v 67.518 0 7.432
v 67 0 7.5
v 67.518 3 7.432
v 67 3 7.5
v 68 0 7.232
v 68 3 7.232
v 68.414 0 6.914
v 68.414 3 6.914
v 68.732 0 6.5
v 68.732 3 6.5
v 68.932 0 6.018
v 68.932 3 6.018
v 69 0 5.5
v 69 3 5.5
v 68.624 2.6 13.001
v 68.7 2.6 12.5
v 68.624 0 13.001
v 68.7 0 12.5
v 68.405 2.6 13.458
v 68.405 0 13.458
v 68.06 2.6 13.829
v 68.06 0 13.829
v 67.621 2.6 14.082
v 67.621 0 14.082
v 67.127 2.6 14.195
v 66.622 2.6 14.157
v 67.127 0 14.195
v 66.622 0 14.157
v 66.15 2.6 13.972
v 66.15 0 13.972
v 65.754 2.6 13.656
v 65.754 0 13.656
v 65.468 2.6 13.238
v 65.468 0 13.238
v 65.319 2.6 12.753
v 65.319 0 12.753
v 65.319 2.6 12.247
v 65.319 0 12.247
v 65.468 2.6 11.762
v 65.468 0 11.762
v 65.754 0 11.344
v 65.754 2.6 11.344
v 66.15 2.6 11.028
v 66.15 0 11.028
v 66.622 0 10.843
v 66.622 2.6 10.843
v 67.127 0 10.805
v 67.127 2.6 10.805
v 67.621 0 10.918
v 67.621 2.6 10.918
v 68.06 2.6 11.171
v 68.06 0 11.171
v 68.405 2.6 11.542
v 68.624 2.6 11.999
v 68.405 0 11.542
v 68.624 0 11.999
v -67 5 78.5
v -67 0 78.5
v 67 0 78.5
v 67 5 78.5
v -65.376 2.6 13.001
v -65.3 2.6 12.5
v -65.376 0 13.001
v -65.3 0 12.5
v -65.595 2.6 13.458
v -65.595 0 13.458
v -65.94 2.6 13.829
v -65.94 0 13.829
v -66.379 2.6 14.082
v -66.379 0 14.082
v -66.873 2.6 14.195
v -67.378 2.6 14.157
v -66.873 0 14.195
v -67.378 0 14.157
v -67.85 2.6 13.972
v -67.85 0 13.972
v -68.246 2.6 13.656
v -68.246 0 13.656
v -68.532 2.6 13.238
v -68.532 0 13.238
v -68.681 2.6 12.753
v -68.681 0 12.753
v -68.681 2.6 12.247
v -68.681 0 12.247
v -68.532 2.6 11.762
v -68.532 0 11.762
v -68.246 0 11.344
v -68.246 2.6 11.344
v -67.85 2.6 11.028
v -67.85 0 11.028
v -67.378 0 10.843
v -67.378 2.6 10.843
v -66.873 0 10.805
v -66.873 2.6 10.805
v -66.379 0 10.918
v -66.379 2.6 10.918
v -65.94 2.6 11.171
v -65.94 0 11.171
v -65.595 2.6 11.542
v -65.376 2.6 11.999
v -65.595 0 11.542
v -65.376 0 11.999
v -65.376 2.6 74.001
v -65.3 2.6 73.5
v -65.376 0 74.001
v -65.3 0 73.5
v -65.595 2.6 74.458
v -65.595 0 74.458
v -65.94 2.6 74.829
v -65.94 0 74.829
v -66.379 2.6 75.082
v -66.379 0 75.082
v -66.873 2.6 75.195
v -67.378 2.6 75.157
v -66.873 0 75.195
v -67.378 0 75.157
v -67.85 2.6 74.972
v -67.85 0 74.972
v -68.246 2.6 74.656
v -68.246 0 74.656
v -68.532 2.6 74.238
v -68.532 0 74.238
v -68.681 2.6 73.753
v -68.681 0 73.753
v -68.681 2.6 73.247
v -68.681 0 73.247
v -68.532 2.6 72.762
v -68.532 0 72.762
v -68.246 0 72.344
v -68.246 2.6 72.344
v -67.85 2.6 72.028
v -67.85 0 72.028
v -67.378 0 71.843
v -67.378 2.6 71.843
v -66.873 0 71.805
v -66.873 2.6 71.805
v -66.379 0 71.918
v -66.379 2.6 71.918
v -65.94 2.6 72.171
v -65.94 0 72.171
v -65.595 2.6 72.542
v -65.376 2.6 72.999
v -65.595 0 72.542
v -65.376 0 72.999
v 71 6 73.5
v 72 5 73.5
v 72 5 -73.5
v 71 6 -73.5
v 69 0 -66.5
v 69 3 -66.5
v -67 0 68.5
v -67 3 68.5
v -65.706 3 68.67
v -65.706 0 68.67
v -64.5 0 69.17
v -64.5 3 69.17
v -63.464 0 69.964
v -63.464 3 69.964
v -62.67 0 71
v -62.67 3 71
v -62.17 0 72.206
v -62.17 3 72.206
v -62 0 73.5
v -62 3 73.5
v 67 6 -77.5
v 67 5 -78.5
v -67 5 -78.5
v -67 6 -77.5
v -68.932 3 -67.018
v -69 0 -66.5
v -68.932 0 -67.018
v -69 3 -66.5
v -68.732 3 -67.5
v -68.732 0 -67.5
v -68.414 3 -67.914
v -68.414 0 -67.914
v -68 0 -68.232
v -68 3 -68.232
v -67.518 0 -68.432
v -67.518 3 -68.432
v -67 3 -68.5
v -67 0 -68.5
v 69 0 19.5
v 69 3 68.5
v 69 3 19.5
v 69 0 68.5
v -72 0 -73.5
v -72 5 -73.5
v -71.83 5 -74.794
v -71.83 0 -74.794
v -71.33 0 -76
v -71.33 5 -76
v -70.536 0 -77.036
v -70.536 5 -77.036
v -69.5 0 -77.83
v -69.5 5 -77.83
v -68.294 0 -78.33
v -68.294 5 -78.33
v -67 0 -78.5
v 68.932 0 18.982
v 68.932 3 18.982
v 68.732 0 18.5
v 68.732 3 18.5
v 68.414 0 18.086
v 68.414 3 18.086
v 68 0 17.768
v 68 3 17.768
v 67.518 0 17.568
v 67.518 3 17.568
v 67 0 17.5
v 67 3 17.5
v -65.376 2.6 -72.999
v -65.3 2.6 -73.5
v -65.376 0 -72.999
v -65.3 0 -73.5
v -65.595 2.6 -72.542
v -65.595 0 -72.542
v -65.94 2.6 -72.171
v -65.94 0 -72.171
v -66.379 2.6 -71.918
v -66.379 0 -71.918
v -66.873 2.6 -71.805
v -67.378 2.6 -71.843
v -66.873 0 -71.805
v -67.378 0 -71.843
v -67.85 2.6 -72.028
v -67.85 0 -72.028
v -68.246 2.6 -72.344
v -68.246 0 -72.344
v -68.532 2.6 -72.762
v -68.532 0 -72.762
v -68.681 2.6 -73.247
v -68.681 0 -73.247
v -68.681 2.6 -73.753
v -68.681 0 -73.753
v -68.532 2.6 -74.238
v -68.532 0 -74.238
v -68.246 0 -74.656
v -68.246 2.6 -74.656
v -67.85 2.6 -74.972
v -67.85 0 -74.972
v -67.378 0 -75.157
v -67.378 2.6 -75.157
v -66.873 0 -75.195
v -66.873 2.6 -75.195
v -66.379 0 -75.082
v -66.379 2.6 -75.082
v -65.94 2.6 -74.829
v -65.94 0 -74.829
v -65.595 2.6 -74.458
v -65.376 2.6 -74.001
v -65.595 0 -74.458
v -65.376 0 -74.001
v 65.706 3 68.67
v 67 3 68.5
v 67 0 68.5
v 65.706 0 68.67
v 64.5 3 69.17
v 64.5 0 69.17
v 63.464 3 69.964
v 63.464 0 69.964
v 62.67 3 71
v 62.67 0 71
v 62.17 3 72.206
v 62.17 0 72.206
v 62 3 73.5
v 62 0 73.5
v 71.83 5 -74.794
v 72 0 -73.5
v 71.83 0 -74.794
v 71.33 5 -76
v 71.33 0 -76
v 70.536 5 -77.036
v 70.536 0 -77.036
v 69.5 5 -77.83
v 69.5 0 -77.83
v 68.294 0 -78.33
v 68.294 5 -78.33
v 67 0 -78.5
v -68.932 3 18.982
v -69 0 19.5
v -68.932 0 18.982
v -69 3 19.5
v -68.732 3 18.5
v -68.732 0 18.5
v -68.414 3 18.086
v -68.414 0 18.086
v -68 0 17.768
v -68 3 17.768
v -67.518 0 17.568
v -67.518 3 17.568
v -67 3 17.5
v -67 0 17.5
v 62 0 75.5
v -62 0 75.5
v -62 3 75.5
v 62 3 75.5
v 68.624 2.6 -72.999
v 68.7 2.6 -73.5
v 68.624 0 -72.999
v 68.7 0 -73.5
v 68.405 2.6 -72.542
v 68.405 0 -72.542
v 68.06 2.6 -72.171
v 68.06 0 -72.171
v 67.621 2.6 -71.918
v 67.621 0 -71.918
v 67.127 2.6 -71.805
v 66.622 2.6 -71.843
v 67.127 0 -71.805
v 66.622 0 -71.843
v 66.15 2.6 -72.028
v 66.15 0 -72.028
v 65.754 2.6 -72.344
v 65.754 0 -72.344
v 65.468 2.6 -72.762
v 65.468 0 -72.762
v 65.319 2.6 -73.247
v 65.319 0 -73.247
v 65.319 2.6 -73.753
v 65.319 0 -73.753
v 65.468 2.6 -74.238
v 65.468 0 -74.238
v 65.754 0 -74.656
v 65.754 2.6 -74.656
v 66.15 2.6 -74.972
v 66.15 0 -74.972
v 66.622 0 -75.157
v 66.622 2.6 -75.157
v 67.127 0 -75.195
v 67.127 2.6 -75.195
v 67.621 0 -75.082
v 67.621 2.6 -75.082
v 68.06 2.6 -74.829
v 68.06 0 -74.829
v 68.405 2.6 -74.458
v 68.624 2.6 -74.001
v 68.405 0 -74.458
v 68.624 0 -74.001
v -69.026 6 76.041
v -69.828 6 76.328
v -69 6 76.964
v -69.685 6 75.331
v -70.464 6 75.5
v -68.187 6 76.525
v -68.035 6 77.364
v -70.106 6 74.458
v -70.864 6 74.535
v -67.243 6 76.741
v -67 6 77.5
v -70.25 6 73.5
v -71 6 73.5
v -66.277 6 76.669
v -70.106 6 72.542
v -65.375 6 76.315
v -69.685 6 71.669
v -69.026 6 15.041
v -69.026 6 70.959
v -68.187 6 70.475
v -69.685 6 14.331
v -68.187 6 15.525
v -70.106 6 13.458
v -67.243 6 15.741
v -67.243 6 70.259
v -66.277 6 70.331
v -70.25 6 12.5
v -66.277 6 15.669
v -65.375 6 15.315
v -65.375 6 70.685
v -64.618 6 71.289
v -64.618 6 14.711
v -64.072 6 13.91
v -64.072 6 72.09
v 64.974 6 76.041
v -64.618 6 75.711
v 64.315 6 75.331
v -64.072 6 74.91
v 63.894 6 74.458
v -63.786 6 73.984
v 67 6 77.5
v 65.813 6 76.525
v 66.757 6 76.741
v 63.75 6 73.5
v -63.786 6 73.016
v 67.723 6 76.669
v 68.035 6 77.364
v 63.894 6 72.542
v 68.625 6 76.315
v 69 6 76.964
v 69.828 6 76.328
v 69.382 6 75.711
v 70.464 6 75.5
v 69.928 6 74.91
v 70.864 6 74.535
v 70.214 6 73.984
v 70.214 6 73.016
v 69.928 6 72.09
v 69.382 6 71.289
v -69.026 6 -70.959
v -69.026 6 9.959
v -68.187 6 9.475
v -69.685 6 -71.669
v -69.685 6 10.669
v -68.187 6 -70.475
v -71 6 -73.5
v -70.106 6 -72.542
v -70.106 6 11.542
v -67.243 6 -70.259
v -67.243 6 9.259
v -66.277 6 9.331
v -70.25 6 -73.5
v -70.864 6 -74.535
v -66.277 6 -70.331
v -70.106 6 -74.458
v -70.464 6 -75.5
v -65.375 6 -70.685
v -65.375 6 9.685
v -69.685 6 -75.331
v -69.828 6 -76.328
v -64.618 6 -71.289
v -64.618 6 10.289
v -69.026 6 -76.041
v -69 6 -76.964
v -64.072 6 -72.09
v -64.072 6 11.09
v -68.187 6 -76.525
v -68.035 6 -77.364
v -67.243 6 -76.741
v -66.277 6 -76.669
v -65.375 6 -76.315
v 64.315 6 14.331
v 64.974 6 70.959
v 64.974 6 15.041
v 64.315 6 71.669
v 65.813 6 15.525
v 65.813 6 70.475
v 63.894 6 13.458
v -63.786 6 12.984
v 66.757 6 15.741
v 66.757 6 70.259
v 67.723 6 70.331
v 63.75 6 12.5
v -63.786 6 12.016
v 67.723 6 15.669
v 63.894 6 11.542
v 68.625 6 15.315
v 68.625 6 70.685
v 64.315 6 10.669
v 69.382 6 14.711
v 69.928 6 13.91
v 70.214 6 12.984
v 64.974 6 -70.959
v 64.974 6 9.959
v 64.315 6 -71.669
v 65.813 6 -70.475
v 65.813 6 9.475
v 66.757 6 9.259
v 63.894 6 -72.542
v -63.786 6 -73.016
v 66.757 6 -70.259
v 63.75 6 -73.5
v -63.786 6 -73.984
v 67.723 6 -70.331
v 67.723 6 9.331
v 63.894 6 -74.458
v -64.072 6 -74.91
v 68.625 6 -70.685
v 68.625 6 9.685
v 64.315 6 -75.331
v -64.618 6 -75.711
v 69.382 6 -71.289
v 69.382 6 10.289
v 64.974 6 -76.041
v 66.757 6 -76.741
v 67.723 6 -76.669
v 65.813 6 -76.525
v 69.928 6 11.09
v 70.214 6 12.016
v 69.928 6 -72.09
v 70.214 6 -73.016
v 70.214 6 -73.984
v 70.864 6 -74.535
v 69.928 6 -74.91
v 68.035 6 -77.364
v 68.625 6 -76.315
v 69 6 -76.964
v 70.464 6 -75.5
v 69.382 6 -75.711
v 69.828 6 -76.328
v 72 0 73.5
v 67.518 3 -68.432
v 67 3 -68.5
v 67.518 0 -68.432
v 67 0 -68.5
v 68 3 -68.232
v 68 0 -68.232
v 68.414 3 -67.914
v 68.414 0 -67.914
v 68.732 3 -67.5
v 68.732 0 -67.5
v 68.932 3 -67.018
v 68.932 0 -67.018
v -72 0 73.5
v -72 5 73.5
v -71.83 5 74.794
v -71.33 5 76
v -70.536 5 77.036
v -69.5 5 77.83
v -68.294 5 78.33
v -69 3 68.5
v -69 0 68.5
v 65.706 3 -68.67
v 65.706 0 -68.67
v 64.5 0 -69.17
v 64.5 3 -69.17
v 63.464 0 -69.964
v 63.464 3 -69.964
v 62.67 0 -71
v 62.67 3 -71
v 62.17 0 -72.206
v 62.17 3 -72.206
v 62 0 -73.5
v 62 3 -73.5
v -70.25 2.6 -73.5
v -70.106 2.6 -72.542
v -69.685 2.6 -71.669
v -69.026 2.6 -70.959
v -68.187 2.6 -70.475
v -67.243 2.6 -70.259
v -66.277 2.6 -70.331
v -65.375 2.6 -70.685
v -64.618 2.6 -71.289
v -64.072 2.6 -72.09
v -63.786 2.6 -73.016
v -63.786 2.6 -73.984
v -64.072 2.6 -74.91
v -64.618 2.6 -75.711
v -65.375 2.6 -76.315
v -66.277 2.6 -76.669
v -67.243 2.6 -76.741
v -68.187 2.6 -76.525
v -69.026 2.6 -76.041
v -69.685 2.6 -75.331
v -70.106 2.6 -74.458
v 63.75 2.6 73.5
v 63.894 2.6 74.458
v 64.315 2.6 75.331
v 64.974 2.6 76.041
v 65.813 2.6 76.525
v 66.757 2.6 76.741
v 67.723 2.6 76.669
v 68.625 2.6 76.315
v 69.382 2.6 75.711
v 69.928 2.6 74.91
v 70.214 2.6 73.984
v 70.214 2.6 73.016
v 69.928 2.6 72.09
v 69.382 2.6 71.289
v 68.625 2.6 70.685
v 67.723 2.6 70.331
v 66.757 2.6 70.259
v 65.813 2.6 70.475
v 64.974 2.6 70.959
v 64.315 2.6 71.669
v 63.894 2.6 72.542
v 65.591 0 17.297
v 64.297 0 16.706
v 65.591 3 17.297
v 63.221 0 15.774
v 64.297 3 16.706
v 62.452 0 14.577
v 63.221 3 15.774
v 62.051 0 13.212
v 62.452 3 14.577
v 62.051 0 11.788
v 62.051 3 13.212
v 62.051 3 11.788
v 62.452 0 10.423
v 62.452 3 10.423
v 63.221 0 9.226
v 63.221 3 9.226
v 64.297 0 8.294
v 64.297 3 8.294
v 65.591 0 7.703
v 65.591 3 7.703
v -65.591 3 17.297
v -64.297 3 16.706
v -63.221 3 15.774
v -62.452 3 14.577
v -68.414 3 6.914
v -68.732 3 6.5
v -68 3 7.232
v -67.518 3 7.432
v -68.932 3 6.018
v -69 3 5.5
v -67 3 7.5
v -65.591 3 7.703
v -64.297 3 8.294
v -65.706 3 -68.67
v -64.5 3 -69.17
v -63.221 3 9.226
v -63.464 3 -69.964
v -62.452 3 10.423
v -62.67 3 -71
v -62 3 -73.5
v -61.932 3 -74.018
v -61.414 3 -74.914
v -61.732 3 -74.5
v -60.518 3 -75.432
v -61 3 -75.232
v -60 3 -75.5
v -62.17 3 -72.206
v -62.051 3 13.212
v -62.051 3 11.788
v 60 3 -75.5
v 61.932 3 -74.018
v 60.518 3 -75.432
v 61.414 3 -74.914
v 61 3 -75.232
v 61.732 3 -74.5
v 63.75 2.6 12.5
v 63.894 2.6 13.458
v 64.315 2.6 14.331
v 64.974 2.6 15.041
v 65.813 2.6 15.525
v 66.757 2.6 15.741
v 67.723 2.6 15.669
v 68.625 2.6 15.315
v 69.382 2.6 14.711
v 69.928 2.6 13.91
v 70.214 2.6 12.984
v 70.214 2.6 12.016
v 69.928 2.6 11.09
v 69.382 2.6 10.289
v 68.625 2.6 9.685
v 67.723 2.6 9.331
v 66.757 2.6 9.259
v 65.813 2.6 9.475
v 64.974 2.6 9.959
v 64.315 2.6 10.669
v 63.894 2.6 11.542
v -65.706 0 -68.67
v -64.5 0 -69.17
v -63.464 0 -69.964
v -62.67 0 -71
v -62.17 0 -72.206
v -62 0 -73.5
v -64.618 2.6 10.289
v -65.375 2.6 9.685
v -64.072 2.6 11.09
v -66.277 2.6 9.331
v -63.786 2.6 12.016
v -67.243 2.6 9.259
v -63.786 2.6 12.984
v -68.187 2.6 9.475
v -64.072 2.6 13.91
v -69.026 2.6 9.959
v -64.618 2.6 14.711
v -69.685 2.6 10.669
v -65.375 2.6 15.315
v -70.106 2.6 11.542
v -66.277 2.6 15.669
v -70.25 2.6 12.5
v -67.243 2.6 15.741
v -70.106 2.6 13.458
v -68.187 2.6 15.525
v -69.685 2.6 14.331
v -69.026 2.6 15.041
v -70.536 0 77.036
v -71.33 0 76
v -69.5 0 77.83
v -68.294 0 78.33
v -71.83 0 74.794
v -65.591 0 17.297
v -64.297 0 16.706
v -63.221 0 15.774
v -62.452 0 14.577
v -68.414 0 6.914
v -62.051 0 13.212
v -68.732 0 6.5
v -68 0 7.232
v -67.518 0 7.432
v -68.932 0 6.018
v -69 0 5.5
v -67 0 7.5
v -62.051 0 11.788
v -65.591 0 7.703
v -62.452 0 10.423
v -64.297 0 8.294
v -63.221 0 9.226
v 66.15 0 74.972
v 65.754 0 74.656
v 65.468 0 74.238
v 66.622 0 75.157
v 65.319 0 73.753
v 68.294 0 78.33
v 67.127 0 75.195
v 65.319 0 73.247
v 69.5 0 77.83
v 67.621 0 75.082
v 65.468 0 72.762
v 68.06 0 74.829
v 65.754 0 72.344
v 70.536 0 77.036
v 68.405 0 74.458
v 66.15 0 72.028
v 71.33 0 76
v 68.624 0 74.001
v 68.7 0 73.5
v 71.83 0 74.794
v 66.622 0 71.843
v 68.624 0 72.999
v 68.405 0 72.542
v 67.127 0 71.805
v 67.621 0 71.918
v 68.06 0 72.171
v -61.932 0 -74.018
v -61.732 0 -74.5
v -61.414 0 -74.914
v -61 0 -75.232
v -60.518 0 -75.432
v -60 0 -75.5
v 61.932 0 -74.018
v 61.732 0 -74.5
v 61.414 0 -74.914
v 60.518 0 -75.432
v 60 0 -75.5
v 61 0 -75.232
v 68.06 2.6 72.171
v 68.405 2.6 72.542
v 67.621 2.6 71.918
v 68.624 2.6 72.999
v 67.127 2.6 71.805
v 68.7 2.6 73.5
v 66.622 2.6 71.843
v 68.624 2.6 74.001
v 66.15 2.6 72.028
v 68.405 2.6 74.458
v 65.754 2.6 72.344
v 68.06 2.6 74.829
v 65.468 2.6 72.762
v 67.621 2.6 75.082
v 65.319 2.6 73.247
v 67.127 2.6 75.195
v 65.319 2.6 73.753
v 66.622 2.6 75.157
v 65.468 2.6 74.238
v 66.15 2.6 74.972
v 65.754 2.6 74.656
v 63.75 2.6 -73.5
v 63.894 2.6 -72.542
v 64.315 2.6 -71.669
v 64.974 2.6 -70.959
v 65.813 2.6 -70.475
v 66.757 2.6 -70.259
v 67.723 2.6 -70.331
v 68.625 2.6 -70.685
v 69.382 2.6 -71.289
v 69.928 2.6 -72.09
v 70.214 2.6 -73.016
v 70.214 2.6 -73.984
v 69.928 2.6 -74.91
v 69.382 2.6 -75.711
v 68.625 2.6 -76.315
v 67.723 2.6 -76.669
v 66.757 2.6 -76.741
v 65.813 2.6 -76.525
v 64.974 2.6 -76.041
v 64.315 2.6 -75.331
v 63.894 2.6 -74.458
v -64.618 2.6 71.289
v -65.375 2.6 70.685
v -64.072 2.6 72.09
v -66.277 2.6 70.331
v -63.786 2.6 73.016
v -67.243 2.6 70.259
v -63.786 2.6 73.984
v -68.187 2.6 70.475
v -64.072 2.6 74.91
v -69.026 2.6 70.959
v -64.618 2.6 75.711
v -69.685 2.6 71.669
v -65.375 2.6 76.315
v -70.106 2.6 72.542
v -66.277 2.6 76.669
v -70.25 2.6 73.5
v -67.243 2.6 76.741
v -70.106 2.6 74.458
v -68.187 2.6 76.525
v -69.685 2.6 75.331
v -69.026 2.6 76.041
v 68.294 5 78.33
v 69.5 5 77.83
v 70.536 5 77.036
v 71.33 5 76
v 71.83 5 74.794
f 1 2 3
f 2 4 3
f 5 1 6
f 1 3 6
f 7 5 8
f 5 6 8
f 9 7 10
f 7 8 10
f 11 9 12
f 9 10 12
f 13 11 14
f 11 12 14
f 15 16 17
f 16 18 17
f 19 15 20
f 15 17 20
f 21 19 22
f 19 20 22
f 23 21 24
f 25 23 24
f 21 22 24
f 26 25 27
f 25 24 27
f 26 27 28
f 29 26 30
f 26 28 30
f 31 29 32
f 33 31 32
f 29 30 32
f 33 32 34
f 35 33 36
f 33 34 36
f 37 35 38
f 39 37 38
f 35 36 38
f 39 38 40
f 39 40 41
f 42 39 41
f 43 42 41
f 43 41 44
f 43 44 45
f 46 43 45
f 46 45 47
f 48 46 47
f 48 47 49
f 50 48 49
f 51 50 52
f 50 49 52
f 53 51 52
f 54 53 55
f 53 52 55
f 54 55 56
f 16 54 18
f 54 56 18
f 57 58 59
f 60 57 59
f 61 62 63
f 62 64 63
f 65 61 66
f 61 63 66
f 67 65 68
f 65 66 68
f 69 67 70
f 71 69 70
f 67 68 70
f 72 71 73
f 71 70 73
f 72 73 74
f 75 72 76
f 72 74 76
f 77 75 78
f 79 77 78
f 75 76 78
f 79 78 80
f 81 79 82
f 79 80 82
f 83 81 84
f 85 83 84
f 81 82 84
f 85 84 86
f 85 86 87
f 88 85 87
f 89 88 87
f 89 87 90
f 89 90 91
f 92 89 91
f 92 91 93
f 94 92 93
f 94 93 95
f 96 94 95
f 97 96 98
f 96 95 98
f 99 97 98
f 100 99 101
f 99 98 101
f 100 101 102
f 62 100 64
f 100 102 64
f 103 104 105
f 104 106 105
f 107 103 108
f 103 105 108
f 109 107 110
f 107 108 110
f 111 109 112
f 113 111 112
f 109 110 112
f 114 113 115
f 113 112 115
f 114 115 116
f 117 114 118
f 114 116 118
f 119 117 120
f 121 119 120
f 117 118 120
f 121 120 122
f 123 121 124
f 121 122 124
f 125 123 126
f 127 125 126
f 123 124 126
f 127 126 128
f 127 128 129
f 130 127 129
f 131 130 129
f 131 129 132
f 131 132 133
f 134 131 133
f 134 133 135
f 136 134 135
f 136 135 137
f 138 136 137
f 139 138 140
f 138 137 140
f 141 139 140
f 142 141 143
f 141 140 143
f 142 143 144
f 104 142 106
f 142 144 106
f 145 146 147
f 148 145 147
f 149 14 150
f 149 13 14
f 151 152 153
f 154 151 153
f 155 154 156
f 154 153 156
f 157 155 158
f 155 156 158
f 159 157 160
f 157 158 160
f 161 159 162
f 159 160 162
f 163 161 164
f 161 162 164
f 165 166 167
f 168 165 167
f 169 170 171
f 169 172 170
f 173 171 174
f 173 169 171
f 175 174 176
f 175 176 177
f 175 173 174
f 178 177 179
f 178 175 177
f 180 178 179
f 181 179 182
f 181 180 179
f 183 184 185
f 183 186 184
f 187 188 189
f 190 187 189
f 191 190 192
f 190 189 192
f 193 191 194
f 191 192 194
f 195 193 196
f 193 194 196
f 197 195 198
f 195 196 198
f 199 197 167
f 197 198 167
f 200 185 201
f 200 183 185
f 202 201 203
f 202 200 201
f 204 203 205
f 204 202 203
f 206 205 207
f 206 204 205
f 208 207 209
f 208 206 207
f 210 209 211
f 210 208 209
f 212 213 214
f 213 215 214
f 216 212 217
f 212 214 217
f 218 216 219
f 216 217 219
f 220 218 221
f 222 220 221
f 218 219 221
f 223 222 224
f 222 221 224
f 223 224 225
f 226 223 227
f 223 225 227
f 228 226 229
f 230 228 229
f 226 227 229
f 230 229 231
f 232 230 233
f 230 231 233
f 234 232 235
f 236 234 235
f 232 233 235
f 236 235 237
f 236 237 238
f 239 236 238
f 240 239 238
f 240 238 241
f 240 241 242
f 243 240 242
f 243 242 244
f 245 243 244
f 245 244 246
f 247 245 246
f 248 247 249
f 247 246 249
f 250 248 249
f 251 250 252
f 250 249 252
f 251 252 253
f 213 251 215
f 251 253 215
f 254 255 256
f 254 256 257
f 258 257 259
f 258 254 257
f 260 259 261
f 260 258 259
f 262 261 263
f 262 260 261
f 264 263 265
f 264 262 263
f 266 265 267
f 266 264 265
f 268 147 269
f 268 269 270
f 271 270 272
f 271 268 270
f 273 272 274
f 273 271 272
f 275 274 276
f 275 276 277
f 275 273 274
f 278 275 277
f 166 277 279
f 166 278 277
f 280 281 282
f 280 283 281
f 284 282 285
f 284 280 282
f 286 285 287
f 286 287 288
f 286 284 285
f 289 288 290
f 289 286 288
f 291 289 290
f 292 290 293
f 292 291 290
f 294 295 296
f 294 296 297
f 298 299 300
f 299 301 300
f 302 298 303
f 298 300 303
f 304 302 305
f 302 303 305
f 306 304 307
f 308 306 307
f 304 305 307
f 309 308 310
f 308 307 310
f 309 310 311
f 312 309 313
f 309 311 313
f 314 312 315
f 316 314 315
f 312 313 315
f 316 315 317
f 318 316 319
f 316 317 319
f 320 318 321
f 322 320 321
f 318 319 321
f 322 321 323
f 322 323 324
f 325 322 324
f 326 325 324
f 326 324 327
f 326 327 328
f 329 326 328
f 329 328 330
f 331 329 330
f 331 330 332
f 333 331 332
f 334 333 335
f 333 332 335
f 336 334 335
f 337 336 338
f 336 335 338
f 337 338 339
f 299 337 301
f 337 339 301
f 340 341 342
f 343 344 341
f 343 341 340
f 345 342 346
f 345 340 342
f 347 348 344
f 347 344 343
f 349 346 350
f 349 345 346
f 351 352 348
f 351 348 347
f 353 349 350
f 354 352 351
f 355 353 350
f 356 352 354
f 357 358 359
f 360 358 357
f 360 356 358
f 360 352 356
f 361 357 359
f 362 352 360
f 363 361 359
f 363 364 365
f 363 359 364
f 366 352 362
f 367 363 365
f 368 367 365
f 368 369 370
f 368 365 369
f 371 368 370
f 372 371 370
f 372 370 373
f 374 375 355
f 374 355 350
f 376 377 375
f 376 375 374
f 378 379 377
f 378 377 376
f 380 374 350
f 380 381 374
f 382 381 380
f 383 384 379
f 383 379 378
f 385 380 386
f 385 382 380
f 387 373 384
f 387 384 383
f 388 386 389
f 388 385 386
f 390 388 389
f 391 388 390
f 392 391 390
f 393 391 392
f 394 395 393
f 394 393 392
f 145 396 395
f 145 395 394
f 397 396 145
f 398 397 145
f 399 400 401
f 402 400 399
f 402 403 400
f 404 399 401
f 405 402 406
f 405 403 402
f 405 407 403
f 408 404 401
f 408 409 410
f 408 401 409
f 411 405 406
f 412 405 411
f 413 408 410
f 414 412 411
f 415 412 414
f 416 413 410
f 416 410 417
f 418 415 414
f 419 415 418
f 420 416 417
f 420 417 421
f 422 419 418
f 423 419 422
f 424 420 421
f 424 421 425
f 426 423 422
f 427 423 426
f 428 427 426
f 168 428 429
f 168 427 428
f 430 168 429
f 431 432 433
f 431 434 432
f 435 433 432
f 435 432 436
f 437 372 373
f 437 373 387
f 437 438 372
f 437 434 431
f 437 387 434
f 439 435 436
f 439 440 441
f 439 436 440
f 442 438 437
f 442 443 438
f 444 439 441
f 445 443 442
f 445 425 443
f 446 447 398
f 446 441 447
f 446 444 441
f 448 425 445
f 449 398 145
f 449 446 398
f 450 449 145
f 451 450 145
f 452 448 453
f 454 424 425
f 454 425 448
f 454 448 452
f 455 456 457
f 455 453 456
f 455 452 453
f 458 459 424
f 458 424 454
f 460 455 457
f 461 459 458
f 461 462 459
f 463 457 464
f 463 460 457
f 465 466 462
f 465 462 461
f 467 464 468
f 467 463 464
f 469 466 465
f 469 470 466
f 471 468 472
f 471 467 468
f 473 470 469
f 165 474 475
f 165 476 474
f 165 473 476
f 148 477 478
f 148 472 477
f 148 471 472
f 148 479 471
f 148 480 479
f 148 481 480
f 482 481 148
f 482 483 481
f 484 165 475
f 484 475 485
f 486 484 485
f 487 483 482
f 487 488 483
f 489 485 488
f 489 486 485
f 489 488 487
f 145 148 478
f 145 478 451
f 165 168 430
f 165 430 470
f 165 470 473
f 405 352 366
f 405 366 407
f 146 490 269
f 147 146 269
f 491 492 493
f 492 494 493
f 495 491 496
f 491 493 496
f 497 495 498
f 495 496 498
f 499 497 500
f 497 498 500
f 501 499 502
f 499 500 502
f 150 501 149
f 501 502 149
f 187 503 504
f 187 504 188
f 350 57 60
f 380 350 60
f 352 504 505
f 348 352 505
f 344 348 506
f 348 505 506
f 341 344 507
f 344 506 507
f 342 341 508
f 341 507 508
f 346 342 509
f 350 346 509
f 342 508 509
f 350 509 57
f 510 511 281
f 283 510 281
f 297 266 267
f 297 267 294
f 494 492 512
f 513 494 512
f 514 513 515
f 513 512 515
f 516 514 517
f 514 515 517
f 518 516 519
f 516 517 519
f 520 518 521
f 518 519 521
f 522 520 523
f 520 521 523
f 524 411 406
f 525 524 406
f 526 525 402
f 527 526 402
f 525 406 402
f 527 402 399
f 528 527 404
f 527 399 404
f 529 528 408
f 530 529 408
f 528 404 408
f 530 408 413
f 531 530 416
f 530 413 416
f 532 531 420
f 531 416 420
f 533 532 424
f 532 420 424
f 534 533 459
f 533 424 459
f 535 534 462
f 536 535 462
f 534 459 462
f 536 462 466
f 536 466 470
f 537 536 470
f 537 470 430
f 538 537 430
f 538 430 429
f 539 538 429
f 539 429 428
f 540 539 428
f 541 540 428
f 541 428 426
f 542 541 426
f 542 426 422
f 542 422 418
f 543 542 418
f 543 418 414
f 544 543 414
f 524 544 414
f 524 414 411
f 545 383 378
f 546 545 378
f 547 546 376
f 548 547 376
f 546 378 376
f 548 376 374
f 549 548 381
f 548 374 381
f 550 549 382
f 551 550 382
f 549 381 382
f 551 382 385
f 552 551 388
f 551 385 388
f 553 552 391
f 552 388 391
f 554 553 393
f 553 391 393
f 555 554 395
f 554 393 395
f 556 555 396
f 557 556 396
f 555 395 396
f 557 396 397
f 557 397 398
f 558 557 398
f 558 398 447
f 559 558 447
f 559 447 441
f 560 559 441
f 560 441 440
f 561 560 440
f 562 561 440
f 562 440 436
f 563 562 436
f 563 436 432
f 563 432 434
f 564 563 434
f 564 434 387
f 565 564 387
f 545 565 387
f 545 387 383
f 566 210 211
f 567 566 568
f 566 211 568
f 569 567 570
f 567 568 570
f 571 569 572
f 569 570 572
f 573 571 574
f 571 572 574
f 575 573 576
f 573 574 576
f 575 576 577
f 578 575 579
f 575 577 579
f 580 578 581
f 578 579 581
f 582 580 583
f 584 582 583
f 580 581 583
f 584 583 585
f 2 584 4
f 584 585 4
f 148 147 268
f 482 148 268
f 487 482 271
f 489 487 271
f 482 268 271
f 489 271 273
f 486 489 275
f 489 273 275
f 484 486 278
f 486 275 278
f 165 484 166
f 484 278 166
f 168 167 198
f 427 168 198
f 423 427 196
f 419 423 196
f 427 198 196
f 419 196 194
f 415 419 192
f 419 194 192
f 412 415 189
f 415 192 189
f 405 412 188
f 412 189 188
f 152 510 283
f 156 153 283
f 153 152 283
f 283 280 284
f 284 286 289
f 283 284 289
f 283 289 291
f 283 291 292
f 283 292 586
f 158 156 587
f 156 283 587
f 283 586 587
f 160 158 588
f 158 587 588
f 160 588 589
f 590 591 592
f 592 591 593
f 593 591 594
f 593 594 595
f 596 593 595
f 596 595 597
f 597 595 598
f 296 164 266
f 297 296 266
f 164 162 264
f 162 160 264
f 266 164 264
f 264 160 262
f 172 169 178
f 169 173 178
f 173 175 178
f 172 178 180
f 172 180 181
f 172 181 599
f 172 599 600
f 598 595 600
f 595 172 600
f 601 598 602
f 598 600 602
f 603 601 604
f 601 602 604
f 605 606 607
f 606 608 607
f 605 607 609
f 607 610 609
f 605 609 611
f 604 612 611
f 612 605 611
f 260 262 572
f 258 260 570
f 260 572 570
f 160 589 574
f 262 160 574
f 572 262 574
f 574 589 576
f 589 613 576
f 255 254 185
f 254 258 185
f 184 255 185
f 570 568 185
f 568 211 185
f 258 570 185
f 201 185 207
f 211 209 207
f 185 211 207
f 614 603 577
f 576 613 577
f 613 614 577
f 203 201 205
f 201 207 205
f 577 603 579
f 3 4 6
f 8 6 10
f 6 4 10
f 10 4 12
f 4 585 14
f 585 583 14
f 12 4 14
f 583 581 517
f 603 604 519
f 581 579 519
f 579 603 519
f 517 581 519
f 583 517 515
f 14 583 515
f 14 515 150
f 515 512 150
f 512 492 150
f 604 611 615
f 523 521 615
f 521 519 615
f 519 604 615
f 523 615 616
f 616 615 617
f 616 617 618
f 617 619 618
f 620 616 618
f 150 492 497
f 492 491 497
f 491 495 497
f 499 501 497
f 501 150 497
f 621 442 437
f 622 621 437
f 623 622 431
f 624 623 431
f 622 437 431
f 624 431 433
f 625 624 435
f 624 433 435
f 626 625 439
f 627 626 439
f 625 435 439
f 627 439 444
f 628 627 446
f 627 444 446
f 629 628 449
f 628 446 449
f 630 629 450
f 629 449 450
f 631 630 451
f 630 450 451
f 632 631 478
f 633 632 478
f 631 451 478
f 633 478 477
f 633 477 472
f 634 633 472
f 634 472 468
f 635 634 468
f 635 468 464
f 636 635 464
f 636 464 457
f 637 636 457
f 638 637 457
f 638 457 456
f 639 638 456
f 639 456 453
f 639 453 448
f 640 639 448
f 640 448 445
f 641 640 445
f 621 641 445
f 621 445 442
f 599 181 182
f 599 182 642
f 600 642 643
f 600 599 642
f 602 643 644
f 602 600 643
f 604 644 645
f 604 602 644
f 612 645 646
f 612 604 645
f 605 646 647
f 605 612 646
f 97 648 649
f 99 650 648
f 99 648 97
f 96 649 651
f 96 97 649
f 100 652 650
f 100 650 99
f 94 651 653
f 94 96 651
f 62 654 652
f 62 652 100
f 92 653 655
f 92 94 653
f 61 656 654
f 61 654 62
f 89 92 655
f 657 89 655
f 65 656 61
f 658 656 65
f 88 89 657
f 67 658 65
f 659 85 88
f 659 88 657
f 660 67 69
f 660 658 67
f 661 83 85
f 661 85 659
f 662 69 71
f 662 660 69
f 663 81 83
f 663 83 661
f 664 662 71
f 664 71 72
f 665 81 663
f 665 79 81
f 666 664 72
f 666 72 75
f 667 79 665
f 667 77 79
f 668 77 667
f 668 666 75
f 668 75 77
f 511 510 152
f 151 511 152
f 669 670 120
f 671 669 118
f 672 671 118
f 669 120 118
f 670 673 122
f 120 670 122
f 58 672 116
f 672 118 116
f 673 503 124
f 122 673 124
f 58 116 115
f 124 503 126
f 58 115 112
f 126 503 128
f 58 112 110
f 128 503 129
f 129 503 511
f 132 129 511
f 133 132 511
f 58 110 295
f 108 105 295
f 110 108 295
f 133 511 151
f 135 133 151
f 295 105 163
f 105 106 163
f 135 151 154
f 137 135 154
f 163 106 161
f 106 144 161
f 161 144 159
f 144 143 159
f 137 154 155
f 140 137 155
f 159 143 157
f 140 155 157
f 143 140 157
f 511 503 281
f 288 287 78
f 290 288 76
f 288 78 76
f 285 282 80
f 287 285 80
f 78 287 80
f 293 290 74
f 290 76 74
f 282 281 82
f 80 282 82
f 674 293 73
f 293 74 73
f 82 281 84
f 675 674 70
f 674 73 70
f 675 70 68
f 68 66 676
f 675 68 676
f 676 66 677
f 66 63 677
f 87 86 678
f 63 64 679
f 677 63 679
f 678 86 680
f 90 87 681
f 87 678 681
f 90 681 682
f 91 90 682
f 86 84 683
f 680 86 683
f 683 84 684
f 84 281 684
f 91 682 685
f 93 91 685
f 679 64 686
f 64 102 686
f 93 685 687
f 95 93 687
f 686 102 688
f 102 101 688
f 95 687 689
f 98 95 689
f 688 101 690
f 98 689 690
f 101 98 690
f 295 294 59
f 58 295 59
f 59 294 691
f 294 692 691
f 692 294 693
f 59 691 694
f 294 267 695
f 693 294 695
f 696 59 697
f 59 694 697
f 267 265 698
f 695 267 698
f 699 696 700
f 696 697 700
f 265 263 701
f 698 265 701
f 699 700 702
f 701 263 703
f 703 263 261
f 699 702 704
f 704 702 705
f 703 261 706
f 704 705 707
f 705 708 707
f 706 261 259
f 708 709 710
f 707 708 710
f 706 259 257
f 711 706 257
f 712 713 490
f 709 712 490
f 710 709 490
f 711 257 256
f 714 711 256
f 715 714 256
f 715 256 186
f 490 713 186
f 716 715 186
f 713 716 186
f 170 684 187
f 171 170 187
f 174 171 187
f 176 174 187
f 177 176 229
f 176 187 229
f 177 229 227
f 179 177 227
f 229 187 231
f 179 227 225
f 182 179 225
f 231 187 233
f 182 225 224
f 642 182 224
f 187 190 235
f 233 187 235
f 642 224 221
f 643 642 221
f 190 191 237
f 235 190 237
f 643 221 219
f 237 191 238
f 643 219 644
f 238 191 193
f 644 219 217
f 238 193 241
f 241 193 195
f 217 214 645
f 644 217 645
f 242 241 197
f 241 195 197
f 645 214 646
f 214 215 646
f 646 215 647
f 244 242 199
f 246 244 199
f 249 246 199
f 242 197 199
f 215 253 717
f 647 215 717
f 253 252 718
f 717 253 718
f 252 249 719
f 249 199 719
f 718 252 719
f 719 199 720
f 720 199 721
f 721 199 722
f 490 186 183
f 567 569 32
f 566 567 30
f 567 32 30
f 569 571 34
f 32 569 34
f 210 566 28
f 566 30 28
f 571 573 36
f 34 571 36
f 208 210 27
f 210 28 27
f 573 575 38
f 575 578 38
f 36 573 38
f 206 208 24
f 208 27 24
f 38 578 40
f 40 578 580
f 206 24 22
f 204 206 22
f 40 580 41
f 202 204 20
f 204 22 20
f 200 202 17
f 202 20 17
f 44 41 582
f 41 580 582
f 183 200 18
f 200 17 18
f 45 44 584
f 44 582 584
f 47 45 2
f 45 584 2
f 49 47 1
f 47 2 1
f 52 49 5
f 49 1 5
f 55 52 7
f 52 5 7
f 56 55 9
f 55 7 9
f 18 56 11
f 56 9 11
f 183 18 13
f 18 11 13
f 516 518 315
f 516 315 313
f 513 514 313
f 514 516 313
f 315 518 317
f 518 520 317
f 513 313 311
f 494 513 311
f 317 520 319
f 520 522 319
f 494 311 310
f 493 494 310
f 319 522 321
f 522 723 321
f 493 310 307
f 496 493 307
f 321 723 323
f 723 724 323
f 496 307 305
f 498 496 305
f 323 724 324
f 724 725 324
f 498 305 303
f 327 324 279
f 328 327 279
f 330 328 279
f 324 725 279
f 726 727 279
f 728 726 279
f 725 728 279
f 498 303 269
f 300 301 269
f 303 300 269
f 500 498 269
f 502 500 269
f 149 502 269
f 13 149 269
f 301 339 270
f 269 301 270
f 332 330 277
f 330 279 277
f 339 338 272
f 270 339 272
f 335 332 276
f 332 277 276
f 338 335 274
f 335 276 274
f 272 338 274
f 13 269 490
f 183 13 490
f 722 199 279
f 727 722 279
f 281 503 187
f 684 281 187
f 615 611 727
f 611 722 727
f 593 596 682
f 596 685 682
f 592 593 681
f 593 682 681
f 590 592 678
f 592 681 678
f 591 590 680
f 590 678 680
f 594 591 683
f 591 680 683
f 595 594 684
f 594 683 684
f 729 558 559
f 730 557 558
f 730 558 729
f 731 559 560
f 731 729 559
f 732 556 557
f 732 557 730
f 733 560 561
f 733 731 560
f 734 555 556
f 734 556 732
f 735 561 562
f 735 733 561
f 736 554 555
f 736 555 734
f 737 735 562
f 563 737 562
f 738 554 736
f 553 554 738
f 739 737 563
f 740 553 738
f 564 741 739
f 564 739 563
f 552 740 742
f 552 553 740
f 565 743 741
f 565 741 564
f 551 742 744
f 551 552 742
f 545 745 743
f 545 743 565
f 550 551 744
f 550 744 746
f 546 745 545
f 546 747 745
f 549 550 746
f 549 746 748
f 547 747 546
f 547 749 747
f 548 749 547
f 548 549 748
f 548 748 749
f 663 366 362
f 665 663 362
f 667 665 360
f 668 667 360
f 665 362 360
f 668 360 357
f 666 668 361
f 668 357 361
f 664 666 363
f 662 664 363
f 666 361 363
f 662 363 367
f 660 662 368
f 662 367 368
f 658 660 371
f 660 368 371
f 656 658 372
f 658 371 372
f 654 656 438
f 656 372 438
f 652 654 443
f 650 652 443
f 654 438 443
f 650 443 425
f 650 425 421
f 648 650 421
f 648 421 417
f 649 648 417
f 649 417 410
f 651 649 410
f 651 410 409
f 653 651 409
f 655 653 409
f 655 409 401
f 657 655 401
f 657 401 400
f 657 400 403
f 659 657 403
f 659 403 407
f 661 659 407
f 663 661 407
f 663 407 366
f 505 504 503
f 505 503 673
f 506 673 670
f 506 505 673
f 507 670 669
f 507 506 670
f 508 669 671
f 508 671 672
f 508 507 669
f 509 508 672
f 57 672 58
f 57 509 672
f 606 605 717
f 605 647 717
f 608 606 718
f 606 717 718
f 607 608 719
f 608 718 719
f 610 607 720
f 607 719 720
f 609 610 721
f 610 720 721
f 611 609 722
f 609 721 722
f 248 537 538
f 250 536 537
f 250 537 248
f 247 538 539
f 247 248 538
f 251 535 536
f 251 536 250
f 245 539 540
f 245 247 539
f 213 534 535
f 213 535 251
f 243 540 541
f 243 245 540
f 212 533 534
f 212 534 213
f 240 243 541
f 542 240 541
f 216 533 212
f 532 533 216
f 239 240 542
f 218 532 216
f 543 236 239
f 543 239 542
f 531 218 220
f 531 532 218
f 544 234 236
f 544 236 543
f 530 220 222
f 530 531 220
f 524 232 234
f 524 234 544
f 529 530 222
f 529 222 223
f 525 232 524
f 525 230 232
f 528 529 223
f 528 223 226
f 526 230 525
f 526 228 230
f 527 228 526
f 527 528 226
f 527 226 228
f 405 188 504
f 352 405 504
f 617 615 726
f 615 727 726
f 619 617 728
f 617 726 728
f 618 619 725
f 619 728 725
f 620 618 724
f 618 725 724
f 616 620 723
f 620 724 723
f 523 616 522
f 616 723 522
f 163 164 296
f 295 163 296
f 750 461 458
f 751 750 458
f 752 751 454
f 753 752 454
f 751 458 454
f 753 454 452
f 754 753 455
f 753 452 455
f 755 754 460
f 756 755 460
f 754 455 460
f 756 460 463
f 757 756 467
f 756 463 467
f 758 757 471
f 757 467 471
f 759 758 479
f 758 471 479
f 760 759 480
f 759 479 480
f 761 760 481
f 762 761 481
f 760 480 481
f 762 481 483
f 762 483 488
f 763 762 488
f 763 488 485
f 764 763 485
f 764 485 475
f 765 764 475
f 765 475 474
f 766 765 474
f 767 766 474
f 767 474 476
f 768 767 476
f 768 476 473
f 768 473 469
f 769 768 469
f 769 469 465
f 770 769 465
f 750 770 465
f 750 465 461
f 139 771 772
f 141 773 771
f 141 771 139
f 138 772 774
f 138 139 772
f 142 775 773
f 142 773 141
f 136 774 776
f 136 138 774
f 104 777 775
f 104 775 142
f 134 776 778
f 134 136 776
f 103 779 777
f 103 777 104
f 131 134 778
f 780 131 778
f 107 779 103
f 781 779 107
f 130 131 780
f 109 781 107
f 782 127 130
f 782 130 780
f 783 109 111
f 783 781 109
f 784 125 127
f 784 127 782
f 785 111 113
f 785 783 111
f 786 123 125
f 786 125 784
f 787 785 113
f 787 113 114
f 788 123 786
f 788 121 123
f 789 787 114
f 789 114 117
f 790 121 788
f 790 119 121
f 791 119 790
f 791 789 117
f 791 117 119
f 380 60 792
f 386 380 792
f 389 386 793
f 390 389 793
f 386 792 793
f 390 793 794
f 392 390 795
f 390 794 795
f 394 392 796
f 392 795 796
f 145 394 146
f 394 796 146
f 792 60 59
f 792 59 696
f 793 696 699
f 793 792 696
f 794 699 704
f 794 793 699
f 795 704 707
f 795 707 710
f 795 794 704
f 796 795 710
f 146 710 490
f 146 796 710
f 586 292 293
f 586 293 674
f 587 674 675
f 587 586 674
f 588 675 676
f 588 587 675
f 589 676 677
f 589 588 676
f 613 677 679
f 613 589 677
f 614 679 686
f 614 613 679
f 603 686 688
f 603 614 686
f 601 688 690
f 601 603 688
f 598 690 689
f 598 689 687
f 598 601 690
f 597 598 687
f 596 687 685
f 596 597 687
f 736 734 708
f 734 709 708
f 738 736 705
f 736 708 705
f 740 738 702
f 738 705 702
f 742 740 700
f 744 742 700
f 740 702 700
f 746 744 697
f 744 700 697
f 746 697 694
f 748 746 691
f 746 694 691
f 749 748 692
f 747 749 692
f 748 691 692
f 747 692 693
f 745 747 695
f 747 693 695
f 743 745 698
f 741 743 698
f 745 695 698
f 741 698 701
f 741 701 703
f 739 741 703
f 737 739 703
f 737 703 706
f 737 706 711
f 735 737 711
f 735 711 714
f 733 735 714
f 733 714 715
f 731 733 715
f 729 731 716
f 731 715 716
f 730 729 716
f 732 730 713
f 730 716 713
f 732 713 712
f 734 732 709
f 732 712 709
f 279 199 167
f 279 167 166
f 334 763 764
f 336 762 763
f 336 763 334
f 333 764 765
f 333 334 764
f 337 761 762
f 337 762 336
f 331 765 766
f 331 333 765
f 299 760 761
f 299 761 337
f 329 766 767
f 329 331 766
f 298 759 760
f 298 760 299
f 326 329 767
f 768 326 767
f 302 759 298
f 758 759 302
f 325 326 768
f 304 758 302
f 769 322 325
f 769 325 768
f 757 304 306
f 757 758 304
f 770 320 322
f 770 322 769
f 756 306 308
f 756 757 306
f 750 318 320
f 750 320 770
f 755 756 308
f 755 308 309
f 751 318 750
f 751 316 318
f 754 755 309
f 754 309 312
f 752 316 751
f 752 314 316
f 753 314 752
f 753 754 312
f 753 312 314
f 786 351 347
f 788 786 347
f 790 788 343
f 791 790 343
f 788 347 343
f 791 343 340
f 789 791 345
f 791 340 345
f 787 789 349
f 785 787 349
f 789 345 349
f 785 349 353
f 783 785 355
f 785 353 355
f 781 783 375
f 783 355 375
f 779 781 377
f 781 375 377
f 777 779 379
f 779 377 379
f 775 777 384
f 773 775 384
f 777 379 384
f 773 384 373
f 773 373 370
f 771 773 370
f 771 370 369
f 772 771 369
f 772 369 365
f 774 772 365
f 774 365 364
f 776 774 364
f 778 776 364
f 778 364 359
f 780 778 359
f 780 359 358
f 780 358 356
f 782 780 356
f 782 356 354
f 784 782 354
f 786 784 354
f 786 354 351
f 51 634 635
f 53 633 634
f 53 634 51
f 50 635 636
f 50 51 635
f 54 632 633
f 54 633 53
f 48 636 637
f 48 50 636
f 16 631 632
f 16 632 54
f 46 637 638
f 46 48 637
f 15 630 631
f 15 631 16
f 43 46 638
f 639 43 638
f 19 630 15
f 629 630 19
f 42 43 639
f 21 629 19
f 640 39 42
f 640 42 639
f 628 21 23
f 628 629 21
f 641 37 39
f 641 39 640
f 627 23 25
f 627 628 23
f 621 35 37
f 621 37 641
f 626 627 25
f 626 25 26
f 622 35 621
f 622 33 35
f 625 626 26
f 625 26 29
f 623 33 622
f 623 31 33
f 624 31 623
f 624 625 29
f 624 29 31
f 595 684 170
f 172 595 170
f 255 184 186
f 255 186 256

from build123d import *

# Parameters (mm, degrees)
SKETCH_1_W                   = 144
SKETCH_1_H                   = 157
EXTRUDE_1_DEPTH              = 6
FILLET_1_R                   = 5
SHELL_1_T                    = -3
EXTRUDE_2_DEPTH              = 6
HOLE_WIZARD_M3_1_D           = 3.4
HOLE_WIZARD_M3_1_CBORE_D     = 6.5
HOLE_WIZARD_M3_1_CBORE_DEPTH = 3.4
CHAMFER_1_SIZE               = 1
FILLET_4_R                   = 2


with BuildPart() as part:
    # 草图1 → 凸台-拉伸1 (new body)
    with BuildSketch(Plane(origin=(0, 0, 0), x_dir=(1, 0, 0), z_dir=(0, 1, 0))):
        Rectangle(SKETCH_1_W, SKETCH_1_H)
    extrude(amount=EXTRUDE_1_DEPTH)

    # 圆角1
    fillet_1_edges = [part.edges().sort_by_distance(p)[0] for p in [
        (72, 3, 78.5),
        (-72, 3, 78.5),
        (-72, 3, -78.5),
        (72, 3, -78.5),
    ]]
    fillet(fillet_1_edges, radius=FILLET_1_R)

    # 抽壳1
    shell_1_openings = [part.faces().sort_by_distance(p)[0] for p in [
        (0, 0, 0),
    ]]
    offset(amount=SHELL_1_T, openings=shell_1_openings, kind=Kind.INTERSECTION)

    # 草图3 → 凸台-拉伸2 (add)
    with BuildSketch(Plane(origin=(0, 6, 0), x_dir=(1, 0, 0), z_dir=(0, 1, 0))):
        with BuildLine():
            Line((-62, 73.5), (-62, 77.035533906))
            Line((-62, 77.035533906), (-70.535533906, 77.035533906))
            Line((-70.535533906, 77.035533906), (-70.535533906, 68.5))
            Line((-70.535533906, 68.5), (-67, 68.5))
            ThreePointArc((-67, 68.5), (-63.464466094, 69.964466094), (-62, 73.5))
        make_face()
        with BuildLine():
            Line((-67, -7.5), (-72, -7.5))
            Line((-72, -7.5), (-72, -17.5))
            Line((-72, -17.5), (-67, -17.5))
            ThreePointArc((-67, -17.5), (-62, -12.5), (-67, -7.5))
        make_face()
        with BuildLine():
            Line((72, -7.5), (72, -17.5))
            Line((72, -17.5), (67, -17.5))
            ThreePointArc((67, -17.5), (62, -12.5), (67, -7.5))
            Line((67, -7.5), (72, -7.5))
        make_face()
        with BuildLine():
            Line((70.535533906, 68.5), (67, 68.5))
            ThreePointArc((67, 68.5), (63.464466094, 69.964466094), (62, 73.5))
            Line((62, 73.5), (62, 77.035533906))
            Line((62, 77.035533906), (70.535533906, 77.035533906))
            Line((70.535533906, 77.035533906), (70.535533906, 68.5))
        make_face()
        with BuildLine():
            Line((62, -73.5), (62, -77.035533906))
            Line((62, -77.035533906), (70.535533906, -77.035533906))
            Line((70.535533906, -77.035533906), (70.535533906, -68.5))
            Line((70.535533906, -68.5), (67, -68.5))
            ThreePointArc((67, -68.5), (63.464466094, -69.964466094), (62, -73.5))
        make_face()
        with BuildLine():
            Line((-62, -73.5), (-62, -77.035533906))
            Line((-62, -77.035533906), (-70.535533906, -77.035533906))
            Line((-70.535533906, -77.035533906), (-70.535533906, -68.5))
            Line((-70.535533906, -68.5), (-67, -68.5))
            ThreePointArc((-67, -68.5), (-63.464466094, -69.964466094), (-62, -73.5))
        make_face()
    extrude(amount=-EXTRUDE_2_DEPTH)

    # M3 六角凹头螺钉的柱形沉头孔1 (through all)
    with Locations(Plane(origin=(0, 6, 0), x_dir=(-1, 0, 0), z_dir=(0, 1, 0))):
        with Locations((67, 12.5), (67, -73.5), (-67, -73.5), (-67, 12.5), (-67, 73.5), (67, 73.5)):
            CounterBoreHole(HOLE_WIZARD_M3_1_D / 2, HOLE_WIZARD_M3_1_CBORE_D / 2, HOLE_WIZARD_M3_1_CBORE_DEPTH)

    # 倒角1
    chamfer_1_edges = [part.edges().sort_by_distance(p)[0] for p in [
        (72, 6, 0),
        (0, 6, 78.5),
        (0, 6, -78.5),
        (-72, 6, 0),
        (-70.535533906, 6, -77.035533906),
        (70.535533906, 6, -77.035533906),
        (-70.535533906, 6, 77.035533906),
        (70.535533906, 6, 77.035533906),
    ]]
    chamfer(chamfer_1_edges, length=CHAMFER_1_SIZE)

    # 圆角4
    fillet_4_edges = [part.edges().sort_by_distance(p)[0] for p in [
        (69, 1.5, -68.5),
        (62, 1.5, -75.5),
        (69, 1.5, 7.5),
        (69, 1.5, 17.5),
        (-69, 1.5, 17.5),
        (-62, 1.5, -75.5),
        (-69, 1.5, -68.5),
        (-69, 1.5, 7.5),
    ]]
    fillet(fillet_4_edges, radius=FILLET_4_R - 0.0001)  # a hair under: the kernel refuses the full size


solid = part.part
